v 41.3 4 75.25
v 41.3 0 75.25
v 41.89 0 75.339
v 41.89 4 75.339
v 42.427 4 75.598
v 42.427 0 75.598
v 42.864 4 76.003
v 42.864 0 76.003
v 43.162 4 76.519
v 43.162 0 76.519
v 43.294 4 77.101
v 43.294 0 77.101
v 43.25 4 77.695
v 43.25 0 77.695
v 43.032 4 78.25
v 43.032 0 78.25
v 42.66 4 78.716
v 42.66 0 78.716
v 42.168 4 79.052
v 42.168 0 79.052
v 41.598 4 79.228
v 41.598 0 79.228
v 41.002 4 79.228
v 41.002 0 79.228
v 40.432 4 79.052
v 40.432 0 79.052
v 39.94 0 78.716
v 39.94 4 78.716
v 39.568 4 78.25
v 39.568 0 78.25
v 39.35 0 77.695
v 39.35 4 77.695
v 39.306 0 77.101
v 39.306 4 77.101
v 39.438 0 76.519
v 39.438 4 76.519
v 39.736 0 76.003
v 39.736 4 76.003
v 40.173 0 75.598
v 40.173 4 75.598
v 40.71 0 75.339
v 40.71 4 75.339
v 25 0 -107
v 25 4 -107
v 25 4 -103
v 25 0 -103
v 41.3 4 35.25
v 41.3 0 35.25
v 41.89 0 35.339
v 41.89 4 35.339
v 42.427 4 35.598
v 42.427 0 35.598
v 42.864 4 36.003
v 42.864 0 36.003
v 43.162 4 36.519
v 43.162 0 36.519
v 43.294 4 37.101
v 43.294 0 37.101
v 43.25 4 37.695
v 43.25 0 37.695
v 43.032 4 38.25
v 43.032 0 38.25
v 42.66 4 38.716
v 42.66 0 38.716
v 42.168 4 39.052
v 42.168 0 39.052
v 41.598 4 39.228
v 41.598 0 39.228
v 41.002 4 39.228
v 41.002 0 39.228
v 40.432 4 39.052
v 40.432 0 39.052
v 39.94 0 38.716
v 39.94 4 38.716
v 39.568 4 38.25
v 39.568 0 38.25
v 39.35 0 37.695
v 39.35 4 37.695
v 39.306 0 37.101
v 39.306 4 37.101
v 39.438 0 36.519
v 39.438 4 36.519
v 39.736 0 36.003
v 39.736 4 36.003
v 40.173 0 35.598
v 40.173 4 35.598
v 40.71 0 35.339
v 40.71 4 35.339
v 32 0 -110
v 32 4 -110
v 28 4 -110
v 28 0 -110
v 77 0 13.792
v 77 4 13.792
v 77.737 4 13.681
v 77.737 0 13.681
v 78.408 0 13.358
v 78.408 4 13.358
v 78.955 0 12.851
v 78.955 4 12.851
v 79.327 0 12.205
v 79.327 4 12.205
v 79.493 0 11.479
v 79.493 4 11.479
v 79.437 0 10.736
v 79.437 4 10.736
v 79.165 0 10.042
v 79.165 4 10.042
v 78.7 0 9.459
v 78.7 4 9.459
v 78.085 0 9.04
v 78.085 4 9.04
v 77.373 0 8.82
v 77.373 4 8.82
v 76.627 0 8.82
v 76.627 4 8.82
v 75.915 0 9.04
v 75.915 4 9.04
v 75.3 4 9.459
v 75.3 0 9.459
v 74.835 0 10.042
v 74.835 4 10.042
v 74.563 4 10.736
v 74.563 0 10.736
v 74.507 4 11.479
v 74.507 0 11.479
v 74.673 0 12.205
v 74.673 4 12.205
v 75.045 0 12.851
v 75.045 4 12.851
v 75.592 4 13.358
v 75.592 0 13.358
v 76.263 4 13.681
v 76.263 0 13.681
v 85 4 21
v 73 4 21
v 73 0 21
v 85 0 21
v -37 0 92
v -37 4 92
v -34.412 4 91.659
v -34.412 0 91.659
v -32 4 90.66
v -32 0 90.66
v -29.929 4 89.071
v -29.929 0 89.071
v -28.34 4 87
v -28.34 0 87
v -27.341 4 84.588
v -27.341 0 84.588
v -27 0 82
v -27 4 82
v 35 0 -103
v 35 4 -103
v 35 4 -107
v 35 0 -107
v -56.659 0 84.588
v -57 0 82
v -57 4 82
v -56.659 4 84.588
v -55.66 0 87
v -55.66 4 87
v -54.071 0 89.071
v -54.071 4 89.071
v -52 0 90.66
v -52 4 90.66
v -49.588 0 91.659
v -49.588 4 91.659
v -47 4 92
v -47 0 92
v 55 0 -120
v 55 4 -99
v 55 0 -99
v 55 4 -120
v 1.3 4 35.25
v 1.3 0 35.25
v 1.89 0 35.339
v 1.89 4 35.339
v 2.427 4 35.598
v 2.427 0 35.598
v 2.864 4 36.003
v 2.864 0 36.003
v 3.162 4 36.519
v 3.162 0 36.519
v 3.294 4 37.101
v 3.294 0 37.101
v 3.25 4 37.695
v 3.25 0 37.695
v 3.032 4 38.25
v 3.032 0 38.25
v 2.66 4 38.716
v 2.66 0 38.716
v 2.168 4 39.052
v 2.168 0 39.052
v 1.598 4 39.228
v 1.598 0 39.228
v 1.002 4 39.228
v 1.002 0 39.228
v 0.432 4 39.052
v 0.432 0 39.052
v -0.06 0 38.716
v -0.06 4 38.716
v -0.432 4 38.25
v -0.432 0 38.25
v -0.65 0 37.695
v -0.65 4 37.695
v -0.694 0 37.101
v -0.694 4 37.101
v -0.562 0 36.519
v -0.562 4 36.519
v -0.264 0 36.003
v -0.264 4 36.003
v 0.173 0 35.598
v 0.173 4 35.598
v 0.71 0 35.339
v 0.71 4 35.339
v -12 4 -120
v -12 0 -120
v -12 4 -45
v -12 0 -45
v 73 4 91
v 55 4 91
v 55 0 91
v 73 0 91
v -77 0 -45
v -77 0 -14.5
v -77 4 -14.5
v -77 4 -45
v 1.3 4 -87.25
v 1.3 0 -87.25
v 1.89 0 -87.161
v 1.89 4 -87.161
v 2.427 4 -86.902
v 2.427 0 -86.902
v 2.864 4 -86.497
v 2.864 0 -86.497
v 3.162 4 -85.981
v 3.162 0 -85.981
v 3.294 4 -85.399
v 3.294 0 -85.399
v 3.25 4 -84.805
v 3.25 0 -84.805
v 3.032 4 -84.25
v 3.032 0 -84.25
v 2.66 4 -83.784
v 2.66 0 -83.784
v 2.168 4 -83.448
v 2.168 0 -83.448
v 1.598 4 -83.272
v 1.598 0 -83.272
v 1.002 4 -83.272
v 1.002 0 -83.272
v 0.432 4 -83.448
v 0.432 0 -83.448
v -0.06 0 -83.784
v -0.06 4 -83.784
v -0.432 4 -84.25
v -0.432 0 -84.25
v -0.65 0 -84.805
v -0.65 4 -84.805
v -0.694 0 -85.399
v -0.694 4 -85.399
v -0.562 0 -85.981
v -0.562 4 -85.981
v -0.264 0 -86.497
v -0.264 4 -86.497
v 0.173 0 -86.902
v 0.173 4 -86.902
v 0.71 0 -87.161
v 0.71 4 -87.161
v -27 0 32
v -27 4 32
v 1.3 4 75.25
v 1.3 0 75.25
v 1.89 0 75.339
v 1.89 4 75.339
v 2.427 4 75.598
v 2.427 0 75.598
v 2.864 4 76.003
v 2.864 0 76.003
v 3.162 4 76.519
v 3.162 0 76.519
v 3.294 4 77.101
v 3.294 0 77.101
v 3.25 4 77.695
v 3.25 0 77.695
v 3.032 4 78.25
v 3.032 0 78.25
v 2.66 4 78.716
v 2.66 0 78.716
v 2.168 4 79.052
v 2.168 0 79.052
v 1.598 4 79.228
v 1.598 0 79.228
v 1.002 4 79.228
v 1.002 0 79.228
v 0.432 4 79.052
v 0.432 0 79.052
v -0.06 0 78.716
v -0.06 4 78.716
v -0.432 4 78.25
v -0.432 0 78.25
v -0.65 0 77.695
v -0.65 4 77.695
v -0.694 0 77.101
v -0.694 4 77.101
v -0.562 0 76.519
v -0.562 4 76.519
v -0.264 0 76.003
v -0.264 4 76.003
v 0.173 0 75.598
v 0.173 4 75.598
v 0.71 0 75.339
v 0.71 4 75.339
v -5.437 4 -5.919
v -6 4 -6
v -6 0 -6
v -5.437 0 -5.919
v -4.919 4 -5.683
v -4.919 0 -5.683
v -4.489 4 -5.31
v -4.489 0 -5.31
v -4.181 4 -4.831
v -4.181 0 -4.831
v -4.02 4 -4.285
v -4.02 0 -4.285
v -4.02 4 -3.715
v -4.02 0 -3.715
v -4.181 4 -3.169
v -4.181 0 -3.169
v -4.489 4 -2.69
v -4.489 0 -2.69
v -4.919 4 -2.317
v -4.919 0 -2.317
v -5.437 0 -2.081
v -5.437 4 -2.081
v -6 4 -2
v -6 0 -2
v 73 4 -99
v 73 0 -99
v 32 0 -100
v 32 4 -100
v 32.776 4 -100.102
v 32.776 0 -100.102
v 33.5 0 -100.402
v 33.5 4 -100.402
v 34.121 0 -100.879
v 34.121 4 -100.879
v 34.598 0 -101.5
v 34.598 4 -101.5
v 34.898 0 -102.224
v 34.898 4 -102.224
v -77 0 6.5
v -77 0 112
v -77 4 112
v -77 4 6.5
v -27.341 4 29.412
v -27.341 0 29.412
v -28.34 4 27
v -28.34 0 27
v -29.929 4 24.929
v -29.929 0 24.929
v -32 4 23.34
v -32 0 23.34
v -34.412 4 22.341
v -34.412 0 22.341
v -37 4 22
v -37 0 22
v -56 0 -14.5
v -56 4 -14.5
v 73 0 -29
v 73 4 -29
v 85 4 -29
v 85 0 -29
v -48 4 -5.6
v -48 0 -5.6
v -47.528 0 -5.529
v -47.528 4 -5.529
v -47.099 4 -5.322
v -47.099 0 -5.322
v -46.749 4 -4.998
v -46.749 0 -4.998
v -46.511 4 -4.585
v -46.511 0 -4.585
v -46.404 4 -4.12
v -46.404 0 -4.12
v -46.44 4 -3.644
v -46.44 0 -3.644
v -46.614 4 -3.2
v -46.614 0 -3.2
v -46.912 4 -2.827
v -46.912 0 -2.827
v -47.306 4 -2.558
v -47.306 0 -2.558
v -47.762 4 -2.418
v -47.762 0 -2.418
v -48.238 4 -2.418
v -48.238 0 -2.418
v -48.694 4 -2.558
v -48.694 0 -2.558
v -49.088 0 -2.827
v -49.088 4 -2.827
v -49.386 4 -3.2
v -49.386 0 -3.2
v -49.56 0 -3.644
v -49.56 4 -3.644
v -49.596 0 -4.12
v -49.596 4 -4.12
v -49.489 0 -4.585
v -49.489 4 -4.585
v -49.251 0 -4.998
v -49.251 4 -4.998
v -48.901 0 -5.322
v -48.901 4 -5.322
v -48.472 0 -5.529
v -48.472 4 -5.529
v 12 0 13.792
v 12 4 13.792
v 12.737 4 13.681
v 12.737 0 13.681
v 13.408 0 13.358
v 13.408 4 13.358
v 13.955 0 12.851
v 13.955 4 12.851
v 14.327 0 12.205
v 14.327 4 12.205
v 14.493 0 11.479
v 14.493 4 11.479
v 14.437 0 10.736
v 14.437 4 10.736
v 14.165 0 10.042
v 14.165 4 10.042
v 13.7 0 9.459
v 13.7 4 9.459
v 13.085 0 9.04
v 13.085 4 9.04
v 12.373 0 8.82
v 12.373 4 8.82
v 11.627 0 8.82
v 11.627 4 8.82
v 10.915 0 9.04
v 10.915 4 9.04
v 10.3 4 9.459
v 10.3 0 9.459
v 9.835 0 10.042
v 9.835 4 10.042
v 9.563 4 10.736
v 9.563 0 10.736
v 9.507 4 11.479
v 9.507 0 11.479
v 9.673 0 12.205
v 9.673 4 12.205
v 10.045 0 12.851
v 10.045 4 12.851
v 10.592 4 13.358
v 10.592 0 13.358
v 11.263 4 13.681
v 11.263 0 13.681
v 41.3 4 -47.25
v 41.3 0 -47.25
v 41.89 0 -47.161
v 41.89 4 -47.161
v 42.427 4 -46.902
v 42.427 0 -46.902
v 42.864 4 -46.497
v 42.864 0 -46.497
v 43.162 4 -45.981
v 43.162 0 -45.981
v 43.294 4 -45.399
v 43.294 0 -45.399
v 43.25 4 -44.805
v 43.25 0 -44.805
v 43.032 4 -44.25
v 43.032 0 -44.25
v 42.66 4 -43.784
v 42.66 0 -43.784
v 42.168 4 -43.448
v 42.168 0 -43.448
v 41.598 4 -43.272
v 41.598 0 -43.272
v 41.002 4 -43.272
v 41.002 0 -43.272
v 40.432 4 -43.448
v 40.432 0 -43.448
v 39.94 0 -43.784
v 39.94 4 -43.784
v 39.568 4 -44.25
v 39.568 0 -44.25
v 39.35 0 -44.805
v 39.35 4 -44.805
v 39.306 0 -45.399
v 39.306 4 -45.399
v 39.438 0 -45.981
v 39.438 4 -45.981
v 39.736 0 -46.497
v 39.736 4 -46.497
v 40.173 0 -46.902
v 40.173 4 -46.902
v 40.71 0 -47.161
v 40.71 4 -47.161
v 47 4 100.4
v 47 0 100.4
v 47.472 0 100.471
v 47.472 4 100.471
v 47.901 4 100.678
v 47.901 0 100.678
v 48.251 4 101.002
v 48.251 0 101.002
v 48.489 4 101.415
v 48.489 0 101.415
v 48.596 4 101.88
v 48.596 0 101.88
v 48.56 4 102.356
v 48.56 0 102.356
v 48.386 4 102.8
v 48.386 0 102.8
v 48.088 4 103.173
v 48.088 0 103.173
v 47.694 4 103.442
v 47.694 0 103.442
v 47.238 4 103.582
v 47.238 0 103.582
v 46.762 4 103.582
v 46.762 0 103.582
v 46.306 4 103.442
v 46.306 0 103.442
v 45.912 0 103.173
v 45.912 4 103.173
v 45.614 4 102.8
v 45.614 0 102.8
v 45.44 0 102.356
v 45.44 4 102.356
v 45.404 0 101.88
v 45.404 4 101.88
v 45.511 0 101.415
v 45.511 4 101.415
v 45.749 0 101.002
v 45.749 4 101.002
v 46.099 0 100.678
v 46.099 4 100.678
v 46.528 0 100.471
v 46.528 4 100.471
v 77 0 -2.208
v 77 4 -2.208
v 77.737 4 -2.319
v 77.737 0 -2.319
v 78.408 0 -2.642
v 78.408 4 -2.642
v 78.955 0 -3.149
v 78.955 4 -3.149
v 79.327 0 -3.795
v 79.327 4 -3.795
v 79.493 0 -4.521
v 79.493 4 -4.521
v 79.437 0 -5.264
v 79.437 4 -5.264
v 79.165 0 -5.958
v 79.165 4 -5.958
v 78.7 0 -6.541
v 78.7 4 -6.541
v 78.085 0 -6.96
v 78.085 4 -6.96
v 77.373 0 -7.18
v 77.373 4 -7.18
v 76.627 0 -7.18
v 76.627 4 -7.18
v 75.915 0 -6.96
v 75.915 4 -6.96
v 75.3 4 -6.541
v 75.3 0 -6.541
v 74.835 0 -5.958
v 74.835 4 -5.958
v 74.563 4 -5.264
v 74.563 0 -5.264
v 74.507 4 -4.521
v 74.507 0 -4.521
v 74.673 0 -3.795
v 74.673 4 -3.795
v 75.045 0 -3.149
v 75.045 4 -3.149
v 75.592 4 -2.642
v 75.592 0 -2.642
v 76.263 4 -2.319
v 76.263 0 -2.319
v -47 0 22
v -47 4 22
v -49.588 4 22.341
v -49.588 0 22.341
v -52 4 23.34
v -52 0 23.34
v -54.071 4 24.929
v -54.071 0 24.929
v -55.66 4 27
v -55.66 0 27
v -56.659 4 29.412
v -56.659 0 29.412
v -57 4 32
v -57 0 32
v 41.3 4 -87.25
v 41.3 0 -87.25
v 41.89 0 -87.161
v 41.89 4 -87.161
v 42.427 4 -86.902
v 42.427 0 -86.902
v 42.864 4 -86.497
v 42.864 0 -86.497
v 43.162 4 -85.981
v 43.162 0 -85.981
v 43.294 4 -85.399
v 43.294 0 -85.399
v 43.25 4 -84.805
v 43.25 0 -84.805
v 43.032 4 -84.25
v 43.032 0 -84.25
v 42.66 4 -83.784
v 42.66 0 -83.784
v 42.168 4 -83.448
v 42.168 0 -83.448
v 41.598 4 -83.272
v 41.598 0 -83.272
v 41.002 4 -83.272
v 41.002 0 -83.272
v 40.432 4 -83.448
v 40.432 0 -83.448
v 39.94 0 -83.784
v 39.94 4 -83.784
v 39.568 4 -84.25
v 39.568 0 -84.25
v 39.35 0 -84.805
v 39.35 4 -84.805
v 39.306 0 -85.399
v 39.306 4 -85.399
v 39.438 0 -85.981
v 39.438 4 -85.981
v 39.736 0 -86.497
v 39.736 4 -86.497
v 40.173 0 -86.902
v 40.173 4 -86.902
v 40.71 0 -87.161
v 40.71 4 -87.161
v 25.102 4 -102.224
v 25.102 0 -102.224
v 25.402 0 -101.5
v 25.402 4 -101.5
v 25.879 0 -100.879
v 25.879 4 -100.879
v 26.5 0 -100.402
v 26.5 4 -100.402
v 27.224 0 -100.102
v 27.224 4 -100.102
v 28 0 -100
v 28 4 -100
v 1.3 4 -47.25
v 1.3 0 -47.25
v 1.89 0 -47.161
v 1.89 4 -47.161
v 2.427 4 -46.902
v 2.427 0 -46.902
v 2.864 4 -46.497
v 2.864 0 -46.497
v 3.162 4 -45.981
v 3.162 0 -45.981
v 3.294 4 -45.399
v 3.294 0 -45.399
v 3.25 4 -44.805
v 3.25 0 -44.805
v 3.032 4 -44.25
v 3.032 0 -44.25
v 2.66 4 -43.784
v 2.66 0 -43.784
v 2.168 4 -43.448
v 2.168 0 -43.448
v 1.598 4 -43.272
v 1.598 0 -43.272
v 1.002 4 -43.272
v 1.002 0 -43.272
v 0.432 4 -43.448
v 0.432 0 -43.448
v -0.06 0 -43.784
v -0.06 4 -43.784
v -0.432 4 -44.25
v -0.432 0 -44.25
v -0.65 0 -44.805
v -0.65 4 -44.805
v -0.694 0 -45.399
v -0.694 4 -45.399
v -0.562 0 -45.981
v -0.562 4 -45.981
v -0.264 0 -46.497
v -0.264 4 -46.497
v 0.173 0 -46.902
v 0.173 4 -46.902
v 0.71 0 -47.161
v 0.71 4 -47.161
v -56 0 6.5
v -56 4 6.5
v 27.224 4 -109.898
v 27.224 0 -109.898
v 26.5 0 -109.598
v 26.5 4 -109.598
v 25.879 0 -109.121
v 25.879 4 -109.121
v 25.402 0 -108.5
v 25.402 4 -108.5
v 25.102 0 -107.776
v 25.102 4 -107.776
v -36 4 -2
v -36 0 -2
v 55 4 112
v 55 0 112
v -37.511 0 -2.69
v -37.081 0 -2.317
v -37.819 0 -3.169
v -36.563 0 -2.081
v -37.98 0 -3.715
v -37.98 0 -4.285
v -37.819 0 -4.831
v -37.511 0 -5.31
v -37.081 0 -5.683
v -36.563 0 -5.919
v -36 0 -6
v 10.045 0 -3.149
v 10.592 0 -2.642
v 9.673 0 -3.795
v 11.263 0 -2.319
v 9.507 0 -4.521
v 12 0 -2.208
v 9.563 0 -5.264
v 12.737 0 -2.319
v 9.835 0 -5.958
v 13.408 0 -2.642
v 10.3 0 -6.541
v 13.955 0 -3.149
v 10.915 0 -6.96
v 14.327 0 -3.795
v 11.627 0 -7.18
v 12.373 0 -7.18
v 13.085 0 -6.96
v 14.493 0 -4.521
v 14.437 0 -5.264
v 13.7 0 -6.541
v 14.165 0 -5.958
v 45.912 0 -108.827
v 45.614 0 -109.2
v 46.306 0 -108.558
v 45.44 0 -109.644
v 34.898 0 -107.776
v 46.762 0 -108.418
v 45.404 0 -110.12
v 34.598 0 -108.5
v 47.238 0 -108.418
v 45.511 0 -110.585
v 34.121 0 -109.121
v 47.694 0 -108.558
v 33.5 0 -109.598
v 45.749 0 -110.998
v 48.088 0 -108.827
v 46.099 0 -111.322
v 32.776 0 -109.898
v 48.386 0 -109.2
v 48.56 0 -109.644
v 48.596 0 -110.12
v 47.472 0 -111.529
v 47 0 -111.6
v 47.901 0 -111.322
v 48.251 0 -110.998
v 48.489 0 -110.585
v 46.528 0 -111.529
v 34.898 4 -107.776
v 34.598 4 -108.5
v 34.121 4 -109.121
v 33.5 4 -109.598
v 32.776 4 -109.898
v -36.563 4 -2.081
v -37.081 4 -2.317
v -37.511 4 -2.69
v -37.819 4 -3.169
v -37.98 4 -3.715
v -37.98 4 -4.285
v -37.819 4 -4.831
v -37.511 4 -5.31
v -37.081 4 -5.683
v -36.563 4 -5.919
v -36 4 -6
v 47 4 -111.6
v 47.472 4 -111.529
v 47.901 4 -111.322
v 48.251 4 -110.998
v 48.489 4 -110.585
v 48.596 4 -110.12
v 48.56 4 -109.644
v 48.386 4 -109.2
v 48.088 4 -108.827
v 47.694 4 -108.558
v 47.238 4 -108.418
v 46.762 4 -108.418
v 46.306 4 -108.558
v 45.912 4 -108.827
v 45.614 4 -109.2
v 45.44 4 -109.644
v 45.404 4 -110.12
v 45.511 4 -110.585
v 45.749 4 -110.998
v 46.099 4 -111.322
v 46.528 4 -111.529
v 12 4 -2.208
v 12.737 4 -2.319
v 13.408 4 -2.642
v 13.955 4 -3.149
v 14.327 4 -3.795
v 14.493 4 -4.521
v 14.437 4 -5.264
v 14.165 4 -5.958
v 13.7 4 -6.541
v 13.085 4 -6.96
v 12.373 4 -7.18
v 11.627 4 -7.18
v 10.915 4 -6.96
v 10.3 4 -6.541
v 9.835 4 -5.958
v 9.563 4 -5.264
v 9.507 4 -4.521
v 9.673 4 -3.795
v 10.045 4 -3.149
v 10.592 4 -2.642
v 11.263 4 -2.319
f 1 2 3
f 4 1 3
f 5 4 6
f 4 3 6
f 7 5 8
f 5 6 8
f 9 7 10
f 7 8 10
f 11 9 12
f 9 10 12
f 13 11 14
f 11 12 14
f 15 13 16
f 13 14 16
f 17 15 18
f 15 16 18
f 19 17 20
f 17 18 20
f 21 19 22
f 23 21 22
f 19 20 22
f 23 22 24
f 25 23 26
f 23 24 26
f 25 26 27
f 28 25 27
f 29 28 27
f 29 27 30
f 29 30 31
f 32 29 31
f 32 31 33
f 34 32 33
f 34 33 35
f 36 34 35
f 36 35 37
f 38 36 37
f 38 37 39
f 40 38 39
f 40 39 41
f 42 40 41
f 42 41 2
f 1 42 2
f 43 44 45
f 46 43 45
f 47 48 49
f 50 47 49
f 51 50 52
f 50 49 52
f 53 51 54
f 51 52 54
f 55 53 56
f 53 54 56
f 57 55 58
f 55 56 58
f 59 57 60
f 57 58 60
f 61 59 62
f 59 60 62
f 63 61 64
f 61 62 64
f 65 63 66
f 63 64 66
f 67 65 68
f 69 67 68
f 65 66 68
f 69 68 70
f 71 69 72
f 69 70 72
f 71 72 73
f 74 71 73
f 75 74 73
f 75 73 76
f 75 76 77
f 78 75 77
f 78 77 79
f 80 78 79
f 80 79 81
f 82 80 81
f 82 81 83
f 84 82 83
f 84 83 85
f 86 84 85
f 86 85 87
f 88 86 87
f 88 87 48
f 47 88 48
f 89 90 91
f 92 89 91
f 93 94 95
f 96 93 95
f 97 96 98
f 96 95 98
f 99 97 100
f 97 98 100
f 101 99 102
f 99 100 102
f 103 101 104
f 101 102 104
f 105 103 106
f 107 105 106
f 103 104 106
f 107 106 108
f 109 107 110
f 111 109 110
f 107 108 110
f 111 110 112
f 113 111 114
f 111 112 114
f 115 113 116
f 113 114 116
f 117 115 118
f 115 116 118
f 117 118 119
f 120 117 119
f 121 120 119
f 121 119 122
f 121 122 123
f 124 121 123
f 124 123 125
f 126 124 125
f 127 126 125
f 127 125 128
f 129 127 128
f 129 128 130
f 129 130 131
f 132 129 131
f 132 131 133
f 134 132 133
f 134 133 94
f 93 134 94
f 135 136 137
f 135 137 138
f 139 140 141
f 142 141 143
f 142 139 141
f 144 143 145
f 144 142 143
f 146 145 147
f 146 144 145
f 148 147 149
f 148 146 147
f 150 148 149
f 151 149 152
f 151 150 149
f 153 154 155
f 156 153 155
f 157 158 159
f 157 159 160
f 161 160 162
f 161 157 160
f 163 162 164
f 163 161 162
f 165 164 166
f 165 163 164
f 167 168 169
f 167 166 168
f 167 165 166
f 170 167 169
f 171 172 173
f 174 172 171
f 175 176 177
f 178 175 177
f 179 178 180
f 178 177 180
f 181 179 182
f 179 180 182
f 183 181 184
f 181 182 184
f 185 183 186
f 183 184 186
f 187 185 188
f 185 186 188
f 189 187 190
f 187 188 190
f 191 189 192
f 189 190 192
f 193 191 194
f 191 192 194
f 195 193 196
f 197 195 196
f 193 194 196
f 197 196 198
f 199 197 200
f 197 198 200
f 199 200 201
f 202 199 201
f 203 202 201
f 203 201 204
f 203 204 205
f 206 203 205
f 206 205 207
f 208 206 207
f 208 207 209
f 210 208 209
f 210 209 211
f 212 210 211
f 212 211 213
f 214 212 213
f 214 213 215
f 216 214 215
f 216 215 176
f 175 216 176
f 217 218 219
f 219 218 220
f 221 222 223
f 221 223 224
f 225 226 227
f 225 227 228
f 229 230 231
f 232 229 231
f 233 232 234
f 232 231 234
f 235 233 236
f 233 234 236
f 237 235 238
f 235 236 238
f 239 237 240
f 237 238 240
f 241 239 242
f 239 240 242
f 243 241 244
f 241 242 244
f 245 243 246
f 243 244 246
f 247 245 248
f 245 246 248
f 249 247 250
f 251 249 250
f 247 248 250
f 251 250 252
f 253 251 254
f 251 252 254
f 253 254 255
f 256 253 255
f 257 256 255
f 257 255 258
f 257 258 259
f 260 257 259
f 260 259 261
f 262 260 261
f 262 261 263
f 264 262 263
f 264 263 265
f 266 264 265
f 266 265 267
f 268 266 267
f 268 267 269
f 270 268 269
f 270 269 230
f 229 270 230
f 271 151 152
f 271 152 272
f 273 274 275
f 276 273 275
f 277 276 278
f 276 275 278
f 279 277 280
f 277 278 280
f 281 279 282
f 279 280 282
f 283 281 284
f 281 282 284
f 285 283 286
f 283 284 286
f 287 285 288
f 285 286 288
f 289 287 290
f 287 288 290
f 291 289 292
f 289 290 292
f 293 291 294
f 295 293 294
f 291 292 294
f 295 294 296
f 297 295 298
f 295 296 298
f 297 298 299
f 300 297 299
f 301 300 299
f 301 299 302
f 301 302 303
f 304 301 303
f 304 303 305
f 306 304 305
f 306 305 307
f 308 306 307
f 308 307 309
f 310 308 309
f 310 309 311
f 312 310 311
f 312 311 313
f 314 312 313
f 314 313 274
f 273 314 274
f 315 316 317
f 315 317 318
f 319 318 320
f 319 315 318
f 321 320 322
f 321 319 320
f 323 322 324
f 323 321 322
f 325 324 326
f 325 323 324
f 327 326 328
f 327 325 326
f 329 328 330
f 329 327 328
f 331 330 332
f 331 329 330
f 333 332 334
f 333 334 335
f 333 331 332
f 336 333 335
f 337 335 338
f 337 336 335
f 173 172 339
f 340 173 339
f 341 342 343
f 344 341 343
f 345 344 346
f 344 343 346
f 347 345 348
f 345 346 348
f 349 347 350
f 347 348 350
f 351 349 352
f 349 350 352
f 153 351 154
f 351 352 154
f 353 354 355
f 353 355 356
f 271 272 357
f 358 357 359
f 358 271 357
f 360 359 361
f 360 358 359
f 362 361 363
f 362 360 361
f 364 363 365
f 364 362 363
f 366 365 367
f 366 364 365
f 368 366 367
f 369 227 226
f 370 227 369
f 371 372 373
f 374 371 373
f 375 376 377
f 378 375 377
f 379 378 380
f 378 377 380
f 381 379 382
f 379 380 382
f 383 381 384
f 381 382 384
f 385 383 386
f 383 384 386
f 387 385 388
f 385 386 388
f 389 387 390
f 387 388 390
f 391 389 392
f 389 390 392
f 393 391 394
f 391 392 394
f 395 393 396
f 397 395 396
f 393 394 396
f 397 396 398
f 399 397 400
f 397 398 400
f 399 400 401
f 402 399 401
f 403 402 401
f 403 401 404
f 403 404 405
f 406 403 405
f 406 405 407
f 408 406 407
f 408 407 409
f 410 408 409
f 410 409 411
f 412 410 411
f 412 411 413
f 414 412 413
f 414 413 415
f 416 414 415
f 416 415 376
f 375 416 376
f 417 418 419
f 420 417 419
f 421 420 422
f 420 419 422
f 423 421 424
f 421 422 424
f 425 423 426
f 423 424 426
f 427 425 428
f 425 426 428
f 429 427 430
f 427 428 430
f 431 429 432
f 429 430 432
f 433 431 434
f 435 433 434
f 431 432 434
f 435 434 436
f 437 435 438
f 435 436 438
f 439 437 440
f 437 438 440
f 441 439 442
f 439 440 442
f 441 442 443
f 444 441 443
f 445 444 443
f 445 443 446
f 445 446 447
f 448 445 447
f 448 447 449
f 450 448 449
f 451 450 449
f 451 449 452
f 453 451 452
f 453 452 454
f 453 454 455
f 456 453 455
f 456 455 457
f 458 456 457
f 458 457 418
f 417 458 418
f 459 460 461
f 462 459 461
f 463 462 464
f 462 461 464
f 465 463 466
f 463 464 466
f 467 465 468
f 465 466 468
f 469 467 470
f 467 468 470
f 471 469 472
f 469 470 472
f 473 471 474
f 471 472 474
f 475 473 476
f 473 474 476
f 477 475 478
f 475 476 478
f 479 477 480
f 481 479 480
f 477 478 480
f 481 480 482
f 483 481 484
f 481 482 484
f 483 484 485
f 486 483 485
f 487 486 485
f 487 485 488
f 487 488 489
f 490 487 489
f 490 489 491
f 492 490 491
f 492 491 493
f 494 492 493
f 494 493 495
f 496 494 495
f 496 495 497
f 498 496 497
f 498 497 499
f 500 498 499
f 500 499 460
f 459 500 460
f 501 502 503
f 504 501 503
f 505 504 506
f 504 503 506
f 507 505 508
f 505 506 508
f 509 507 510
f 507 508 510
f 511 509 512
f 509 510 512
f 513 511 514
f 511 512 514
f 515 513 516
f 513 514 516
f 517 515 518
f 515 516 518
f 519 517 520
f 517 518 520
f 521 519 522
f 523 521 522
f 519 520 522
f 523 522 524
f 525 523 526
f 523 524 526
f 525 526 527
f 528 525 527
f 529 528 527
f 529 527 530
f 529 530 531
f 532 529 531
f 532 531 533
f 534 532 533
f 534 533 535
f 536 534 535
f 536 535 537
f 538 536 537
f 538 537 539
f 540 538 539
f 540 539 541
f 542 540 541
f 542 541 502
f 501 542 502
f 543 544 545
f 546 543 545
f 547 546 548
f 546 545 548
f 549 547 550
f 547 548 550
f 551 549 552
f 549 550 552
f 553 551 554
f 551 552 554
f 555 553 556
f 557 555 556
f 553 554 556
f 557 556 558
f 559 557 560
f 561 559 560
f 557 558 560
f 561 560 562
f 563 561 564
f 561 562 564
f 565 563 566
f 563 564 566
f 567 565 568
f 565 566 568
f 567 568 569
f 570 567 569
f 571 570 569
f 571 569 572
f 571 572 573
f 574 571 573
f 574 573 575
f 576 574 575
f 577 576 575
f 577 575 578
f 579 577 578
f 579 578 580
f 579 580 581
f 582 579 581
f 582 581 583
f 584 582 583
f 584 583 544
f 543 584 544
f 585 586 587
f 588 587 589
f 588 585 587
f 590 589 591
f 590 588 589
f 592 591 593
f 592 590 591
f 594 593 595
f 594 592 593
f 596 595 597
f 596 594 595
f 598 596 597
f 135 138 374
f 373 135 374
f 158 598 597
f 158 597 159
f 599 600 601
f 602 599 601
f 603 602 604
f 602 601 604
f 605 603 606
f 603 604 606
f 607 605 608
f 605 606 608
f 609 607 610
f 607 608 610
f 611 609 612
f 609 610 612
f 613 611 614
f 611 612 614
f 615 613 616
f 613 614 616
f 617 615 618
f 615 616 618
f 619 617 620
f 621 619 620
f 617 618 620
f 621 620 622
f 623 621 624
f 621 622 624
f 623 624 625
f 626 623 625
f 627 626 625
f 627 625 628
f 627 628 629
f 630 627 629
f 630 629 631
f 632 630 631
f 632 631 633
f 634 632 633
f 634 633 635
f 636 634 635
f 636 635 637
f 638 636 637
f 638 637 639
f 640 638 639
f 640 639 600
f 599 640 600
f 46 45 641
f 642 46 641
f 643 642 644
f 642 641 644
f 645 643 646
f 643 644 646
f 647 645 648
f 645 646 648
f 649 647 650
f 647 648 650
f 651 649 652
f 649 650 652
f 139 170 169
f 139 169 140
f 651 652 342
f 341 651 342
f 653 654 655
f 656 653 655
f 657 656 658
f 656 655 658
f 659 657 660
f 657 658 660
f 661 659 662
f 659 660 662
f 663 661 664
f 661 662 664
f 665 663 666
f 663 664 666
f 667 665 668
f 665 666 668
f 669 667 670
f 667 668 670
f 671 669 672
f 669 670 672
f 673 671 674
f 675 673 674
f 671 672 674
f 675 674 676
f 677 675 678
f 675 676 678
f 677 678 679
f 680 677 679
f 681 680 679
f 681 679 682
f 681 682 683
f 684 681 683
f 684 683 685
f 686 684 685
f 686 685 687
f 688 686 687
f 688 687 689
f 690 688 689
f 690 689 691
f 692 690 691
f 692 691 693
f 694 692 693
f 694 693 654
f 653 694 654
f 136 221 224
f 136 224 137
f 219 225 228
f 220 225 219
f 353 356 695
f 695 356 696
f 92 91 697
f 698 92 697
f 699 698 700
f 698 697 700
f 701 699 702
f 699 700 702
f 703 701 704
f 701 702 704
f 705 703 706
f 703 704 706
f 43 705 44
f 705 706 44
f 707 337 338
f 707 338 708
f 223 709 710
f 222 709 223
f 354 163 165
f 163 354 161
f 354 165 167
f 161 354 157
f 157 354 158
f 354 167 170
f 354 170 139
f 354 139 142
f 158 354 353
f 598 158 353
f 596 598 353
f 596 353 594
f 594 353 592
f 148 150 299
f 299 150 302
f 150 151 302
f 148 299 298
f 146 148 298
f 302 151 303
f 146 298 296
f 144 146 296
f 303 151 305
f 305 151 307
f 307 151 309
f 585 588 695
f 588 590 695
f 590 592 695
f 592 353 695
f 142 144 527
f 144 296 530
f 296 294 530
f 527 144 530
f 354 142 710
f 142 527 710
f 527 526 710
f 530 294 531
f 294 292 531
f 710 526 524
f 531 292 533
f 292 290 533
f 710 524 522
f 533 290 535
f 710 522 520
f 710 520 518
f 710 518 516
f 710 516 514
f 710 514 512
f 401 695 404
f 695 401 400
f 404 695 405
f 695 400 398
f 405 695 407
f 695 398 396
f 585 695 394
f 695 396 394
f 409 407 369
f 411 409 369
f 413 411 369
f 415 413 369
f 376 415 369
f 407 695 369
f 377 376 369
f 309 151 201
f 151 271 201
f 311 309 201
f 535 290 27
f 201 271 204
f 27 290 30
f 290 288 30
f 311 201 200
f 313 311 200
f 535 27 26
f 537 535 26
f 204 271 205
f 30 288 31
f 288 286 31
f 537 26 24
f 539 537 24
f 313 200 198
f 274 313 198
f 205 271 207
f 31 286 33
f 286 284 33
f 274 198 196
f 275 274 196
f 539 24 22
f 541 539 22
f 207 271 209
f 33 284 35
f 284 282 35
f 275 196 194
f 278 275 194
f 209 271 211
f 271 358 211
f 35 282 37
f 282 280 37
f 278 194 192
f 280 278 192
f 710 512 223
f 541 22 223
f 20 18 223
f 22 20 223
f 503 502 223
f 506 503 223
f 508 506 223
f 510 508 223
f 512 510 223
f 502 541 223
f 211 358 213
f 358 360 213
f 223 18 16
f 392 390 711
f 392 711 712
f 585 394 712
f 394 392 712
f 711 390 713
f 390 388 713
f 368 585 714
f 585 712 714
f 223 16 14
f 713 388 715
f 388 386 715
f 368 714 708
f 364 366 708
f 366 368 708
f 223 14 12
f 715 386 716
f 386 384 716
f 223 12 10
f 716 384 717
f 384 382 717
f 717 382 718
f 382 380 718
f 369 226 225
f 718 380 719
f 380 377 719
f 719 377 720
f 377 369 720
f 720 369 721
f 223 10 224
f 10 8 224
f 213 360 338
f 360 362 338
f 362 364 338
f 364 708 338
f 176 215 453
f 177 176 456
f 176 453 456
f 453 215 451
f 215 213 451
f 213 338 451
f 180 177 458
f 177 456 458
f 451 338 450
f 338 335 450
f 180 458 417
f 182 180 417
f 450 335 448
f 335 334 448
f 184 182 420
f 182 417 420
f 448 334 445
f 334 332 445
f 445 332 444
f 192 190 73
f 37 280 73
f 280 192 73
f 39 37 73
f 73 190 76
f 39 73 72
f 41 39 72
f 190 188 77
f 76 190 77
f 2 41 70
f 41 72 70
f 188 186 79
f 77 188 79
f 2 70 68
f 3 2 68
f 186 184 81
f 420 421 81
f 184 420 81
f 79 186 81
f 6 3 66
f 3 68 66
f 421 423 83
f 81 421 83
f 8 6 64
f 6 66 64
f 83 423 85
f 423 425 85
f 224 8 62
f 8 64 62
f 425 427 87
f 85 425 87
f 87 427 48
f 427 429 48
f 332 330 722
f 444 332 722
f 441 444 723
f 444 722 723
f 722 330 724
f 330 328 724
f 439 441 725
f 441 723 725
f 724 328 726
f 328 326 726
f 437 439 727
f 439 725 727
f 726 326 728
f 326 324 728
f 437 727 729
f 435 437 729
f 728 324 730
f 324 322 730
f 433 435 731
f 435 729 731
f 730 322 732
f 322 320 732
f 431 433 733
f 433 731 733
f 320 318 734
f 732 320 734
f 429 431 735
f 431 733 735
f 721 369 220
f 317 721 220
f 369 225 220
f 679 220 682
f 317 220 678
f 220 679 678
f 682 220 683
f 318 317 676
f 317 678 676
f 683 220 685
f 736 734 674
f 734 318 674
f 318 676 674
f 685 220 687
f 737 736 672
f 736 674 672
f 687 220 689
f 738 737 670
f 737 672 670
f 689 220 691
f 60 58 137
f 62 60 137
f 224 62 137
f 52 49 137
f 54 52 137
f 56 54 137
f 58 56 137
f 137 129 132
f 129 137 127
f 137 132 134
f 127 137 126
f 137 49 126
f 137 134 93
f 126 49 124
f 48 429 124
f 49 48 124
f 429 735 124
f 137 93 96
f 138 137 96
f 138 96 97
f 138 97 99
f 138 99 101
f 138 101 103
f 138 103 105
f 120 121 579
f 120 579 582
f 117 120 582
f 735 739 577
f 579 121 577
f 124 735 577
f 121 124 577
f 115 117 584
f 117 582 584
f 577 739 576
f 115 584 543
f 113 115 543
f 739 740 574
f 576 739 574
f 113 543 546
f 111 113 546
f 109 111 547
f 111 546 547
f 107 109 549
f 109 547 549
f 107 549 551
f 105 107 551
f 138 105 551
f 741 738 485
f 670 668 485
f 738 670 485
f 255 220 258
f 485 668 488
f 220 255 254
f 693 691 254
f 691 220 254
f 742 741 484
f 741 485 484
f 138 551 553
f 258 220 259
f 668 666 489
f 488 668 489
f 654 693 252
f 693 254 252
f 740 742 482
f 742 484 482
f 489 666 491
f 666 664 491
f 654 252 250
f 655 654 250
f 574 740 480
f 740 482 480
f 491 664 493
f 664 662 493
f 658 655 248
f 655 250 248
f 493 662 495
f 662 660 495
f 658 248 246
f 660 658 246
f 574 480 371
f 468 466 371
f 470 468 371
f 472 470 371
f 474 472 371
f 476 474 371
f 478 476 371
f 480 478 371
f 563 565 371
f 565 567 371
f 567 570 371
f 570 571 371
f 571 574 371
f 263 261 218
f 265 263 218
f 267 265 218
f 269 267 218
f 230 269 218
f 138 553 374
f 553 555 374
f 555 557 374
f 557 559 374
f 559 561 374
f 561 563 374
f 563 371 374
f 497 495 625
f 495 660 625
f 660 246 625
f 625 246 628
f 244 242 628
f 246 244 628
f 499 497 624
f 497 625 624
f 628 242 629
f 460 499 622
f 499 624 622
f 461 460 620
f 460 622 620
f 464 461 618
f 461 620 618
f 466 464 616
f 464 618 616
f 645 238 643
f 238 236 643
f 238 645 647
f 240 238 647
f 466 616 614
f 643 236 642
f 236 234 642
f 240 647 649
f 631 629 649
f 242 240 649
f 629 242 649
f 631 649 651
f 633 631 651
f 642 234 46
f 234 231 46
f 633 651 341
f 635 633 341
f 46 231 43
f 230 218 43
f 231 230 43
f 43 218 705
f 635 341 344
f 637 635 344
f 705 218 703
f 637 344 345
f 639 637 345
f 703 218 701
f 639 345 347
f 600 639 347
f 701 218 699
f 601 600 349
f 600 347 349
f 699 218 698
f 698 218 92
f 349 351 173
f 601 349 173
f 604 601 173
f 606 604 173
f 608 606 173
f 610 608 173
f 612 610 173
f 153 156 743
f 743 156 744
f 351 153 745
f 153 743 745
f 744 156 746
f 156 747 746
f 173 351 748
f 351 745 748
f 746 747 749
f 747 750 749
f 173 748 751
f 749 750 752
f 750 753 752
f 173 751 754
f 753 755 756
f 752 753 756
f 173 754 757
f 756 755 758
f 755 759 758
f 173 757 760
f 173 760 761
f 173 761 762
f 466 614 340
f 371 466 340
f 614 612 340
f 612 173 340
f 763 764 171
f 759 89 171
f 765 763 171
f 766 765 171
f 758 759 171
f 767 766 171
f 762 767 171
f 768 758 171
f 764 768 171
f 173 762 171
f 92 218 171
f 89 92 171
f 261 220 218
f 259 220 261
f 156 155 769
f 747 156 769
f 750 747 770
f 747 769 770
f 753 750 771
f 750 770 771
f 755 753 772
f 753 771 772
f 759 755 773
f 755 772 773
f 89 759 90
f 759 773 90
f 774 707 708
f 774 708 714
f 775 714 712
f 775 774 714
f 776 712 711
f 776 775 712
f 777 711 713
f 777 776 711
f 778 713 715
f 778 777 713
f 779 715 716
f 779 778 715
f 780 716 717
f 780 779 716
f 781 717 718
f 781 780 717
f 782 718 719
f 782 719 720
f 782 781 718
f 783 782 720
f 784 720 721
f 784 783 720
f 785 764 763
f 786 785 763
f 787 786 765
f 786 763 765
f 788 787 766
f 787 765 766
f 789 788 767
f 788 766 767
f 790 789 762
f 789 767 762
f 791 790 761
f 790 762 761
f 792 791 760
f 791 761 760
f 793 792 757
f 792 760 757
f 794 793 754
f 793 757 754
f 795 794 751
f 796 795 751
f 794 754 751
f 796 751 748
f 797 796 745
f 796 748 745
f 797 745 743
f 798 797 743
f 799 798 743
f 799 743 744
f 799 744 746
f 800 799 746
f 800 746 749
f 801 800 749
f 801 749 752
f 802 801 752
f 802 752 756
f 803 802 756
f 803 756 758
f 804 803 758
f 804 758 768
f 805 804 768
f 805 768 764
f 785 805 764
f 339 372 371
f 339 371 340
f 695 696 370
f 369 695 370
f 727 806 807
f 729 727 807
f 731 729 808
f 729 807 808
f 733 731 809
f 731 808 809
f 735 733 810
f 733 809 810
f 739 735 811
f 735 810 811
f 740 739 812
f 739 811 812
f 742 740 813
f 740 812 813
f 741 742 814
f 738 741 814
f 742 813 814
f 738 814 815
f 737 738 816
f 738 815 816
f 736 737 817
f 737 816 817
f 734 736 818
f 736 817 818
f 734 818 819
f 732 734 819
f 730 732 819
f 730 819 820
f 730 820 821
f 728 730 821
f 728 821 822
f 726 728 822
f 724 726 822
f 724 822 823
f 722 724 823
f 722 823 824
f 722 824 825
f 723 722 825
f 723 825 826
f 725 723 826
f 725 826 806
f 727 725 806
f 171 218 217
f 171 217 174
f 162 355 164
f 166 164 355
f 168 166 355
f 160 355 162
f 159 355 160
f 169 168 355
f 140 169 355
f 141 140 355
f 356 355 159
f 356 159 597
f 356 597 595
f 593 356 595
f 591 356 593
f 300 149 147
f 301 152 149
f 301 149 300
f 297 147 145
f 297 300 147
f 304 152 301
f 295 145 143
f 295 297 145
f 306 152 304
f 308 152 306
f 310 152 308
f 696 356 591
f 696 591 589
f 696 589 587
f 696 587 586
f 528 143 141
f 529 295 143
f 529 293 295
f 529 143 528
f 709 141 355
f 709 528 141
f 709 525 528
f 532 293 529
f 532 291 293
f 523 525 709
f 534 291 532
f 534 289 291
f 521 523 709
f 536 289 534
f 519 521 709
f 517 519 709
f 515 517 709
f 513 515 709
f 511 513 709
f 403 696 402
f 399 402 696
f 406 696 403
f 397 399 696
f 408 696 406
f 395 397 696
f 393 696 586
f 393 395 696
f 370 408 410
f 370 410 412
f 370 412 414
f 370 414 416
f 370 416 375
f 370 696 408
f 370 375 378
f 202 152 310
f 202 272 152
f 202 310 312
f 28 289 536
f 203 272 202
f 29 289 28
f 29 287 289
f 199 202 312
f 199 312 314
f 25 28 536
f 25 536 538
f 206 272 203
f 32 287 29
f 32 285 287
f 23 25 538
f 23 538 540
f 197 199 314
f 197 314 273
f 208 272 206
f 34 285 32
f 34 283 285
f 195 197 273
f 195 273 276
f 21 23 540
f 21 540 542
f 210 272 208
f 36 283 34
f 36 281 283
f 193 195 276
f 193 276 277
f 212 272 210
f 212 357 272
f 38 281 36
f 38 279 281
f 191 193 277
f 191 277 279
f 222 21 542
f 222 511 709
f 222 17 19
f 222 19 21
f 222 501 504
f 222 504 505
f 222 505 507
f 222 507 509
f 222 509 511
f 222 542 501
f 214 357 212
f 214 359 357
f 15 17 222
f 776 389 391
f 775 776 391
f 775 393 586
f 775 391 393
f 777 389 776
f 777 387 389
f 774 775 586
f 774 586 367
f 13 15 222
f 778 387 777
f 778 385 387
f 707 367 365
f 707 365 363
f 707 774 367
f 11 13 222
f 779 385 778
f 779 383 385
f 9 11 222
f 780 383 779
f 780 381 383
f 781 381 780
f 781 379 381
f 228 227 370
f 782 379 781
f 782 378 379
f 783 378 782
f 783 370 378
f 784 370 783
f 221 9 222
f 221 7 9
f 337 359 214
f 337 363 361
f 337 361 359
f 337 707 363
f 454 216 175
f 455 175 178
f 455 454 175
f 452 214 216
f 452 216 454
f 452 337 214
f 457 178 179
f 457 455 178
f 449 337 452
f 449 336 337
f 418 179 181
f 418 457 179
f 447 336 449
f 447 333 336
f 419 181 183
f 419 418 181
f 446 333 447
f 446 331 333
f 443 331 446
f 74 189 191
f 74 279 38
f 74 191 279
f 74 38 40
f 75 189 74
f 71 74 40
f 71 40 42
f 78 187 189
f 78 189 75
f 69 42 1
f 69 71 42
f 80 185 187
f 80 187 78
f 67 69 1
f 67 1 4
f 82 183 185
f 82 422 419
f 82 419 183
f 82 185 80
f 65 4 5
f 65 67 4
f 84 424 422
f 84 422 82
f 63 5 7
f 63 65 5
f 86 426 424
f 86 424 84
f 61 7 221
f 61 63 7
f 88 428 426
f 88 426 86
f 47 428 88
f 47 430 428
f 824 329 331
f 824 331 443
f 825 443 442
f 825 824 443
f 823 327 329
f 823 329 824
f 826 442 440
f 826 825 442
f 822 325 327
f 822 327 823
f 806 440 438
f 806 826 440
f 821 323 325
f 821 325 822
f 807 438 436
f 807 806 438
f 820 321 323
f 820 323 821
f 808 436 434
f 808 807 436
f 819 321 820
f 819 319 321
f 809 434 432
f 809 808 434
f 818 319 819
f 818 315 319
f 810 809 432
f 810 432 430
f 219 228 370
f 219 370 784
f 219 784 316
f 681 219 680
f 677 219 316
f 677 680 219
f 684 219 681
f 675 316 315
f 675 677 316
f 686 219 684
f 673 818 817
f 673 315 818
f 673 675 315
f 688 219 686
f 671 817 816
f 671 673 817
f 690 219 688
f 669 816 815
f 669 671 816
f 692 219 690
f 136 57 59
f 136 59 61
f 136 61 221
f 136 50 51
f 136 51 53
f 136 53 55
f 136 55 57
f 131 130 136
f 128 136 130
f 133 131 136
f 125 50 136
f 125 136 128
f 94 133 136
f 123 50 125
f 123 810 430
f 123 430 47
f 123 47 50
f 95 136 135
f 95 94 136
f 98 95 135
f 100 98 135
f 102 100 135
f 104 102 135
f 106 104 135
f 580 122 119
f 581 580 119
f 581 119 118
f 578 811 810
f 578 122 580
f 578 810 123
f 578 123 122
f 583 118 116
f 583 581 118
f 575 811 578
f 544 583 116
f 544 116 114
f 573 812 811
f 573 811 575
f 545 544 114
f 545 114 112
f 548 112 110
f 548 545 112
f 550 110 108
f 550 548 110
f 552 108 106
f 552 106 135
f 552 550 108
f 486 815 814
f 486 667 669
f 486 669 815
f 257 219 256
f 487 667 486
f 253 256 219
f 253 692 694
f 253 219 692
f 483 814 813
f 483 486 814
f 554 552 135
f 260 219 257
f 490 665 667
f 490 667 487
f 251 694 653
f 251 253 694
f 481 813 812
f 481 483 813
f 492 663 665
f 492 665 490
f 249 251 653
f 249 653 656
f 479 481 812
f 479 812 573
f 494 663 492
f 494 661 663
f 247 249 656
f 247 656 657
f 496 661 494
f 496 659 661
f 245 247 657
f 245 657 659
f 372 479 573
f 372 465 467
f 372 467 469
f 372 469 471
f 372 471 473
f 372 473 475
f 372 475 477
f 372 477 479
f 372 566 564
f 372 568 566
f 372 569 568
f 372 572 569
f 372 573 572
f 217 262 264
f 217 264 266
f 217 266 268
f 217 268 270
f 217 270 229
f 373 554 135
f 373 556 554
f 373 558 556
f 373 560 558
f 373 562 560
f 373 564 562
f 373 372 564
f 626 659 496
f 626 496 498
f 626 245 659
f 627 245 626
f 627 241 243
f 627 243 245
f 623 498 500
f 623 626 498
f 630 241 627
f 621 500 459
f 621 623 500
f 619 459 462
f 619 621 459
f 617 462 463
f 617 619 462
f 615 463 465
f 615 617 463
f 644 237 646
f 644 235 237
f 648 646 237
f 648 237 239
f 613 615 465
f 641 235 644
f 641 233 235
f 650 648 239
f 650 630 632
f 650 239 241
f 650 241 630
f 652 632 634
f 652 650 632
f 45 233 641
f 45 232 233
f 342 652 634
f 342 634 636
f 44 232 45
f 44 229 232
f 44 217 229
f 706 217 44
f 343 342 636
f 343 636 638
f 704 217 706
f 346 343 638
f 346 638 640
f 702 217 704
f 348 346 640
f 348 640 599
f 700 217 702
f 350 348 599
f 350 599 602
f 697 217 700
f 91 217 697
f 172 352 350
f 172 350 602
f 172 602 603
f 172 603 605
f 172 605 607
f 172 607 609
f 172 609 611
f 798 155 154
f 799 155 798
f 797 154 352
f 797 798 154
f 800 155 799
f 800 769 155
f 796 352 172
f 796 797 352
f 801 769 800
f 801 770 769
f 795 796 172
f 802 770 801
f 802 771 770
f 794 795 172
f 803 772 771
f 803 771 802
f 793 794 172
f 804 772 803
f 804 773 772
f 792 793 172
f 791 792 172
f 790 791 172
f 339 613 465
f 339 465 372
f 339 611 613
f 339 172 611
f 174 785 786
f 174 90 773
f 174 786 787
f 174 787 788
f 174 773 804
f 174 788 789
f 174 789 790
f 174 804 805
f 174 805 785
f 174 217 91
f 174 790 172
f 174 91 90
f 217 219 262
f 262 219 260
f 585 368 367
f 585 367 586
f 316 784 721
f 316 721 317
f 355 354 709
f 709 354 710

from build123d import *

# Parameters (mm, degrees)
SKETCH1_W           = 162
SKETCH1_H           = 232
BOSS_EXTRUDE1_DEPTH = 4
SKETCH4_W           = 30
SKETCH4_H           = 21
SKETCH4_W_2         = 21
CUT_EXTRUDE3_DEPTH  = 148.108803272
SKETCH5_R           = 1.599999999
SKETCH5_R_2         = 1.600000001
SKETCH5_R_3         = 1.6
SKETCH5_R_4         = 2
CUT_EXTRUDE4_DEPTH  = 148.108803272
SKETCH7_W           = 65
SKETCH7_H           = 75
CUT_EXTRUDE6_DEPTH  = 148.108803272
CUT_EXTRUDE7_DEPTH  = 148.108803272
CUT_EXTRUDE8_DEPTH  = 148.108803272
SKETCH10_R          = 2.5
CUT_EXTRUDE9_DEPTH  = 148.108803272
CUT_EXTRUDE10_DEPTH = 4
SKETCH12_W          = 12
SKETCH12_H          = 70
CUT_EXTRUDE11_DEPTH = 4


with BuildPart() as part:
    # Sketch1 → Boss-Extrude1 (new body)
    with BuildSketch(Plane(origin=(0, 0, 0), x_dir=(1, 0, 0), z_dir=(0, 1, 0))):
        with Locations((4, 4)):
            Rectangle(SKETCH1_W, SKETCH1_H)
    extrude(amount=BOSS_EXTRUDE1_DEPTH)

    # Sketch4 → Cut-Extrude3 (cut, through all)
    with BuildSketch(Plane(origin=(0, 4, 0), x_dir=(1, 0, 0), z_dir=(0, 1, 0))):
        with Locations((70, 109.5)):
            Rectangle(SKETCH4_W, SKETCH4_H)
        with Locations((-66.5, 4)):
            Rectangle(SKETCH4_W_2, SKETCH4_H)
        with Locations((70, -101.5)):
            Rectangle(SKETCH4_W, SKETCH4_H)
    extrude(amount=-CUT_EXTRUDE3_DEPTH, mode=Mode.SUBTRACT)

    # Sketch5 → Cut-Extrude4 (cut, through all)
    with BuildSketch(Plane.XZ):
        with Locations(Location((-48.000025976, -4, 0), (0, 0, 270))):
            Circle(SKETCH5_R)
        with Locations(Location((46.999999998, -109.999999999, 0), (0, 0, 270))):
            Circle(SKETCH5_R_2)
        with Locations(Location((46.999999999, 101.999999999, 0), (0, 0, 270))):
            Circle(SKETCH5_R_3)
        with Locations(Location((41.3, 37.25, 0), (0, 0, 270))):
            Circle(SKETCH5_R_4)
        with Locations(Location((41.3, 77.25, 0), (0, 0, 270))):
            Circle(SKETCH5_R_4)
        with Locations(Location((1.3, 37.25, 0), (0, 0, 270))):
            Circle(SKETCH5_R_4)
        with Locations(Location((1.3, 77.25, 0), (0, 0, 270))):
            Circle(SKETCH5_R_4)
        with Locations(Location((41.3, -45.25, 0), (0, 0, 270))):
            Circle(SKETCH5_R_4)
        with Locations(Location((1.3, -45.25, 0), (0, 0, 270))):
            Circle(SKETCH5_R_4)
        with Locations(Location((1.3, -85.25, 0), (0, 0, 270))):
            Circle(SKETCH5_R_4)
        with Locations(Location((41.3, -85.25, 0), (0, 0, 270))):
            Circle(SKETCH5_R_4)
    extrude(amount=-CUT_EXTRUDE4_DEPTH, mode=Mode.SUBTRACT)

    # Sketch7 → Cut-Extrude6 (cut, through all)
    with BuildSketch(Plane.XZ):
        with Locations((-44.5, -82.5)):
            Rectangle(SKETCH7_W, SKETCH7_H)
    extrude(amount=-CUT_EXTRUDE6_DEPTH, mode=Mode.SUBTRACT)

    # Sketch8 → Cut-Extrude7 (cut, through all)
    with BuildSketch(Plane.XZ):
        with BuildLine():
            Line((-47, 92), (-37, 92))
            ThreePointArc((-37, 92), (-29.928932188, 89.071067812), (-27, 82))
            Line((-27, 82), (-27, 32))
            ThreePointArc((-27, 32), (-29.928932188, 24.928932188), (-37, 22))
            Line((-37, 22), (-47, 22))
            ThreePointArc((-47, 22), (-54.071067812, 24.928932188), (-57, 32))
            Line((-57, 32), (-57, 82))
            ThreePointArc((-57, 82), (-54.071067812, 89.071067812), (-47, 92))
        make_face()
    extrude(amount=-CUT_EXTRUDE7_DEPTH, mode=Mode.SUBTRACT)

    # Sketch9 → Cut-Extrude8 (cut, through all)
    with BuildSketch(Plane(origin=(0, 4, 0), x_dir=(1, 0, 0), z_dir=(0, 1, 0))):
        with BuildLine():
            Line((28, 100), (32, 100))
            ThreePointArc((32, 100), (34.121320344, 100.878679656), (35, 103))
            Line((35, 103), (35, 107))
            ThreePointArc((35, 107), (34.121320344, 109.121320344), (32, 110))
            Line((32, 110), (28, 110))
            ThreePointArc((28, 110), (25.878679656, 109.121320344), (25, 107))
            Line((25, 107), (25, 103))
            ThreePointArc((25, 103), (25.878679656, 100.878679656), (28, 100))
        make_face()
    extrude(amount=-CUT_EXTRUDE8_DEPTH, mode=Mode.SUBTRACT)

    # Sketch10 → Cut-Extrude9 (cut, through all)
    with BuildSketch(Plane(origin=(0, 4, 0), x_dir=(1, 0, 0), z_dir=(0, 1, 0))):
        with Locations(Location((12, -11.291947097, 0), (0, 0, 270))):
            Circle(SKETCH10_R)
        with Locations(Location((12, 4.708052903, 0), (0, 0, 270))):
            Circle(SKETCH10_R)
        with Locations(Location((77, 4.708052903, 0), (0, 0, 270))):
            Circle(SKETCH10_R)
        with Locations(Location((77, -11.291947097, 0), (0, 0, 270))):
            Circle(SKETCH10_R)
    extrude(amount=-CUT_EXTRUDE9_DEPTH, mode=Mode.SUBTRACT)

    # Sketch11 → Cut-Extrude10 (cut)
    with BuildSketch(Plane(origin=(0, 4, 0), x_dir=(1, 0, 0), z_dir=(0, 1, 0))):
        with BuildLine():
            Line((-36, 6), (-6, 6))
            ThreePointArc((-6, 6), (-4, 4), (-6, 2))
            Line((-6, 2), (-36, 2))
            ThreePointArc((-36, 2), (-38, 4), (-36, 6))
        make_face()
    extrude(amount=-CUT_EXTRUDE10_DEPTH, mode=Mode.SUBTRACT)

    # Sketch12 → Cut-Extrude11 (cut)
    with BuildSketch(Plane(origin=(0, 4, 0), x_dir=(1, 0, 0), z_dir=(0, 1, 0))):
        with Locations((79, 64)):
            Rectangle(SKETCH12_W, SKETCH12_H)
        with Locations((79, -56)):
            Rectangle(SKETCH12_W, SKETCH12_H)
    extrude(amount=-CUT_EXTRUDE11_DEPTH, mode=Mode.SUBTRACT)


solid = part.part
